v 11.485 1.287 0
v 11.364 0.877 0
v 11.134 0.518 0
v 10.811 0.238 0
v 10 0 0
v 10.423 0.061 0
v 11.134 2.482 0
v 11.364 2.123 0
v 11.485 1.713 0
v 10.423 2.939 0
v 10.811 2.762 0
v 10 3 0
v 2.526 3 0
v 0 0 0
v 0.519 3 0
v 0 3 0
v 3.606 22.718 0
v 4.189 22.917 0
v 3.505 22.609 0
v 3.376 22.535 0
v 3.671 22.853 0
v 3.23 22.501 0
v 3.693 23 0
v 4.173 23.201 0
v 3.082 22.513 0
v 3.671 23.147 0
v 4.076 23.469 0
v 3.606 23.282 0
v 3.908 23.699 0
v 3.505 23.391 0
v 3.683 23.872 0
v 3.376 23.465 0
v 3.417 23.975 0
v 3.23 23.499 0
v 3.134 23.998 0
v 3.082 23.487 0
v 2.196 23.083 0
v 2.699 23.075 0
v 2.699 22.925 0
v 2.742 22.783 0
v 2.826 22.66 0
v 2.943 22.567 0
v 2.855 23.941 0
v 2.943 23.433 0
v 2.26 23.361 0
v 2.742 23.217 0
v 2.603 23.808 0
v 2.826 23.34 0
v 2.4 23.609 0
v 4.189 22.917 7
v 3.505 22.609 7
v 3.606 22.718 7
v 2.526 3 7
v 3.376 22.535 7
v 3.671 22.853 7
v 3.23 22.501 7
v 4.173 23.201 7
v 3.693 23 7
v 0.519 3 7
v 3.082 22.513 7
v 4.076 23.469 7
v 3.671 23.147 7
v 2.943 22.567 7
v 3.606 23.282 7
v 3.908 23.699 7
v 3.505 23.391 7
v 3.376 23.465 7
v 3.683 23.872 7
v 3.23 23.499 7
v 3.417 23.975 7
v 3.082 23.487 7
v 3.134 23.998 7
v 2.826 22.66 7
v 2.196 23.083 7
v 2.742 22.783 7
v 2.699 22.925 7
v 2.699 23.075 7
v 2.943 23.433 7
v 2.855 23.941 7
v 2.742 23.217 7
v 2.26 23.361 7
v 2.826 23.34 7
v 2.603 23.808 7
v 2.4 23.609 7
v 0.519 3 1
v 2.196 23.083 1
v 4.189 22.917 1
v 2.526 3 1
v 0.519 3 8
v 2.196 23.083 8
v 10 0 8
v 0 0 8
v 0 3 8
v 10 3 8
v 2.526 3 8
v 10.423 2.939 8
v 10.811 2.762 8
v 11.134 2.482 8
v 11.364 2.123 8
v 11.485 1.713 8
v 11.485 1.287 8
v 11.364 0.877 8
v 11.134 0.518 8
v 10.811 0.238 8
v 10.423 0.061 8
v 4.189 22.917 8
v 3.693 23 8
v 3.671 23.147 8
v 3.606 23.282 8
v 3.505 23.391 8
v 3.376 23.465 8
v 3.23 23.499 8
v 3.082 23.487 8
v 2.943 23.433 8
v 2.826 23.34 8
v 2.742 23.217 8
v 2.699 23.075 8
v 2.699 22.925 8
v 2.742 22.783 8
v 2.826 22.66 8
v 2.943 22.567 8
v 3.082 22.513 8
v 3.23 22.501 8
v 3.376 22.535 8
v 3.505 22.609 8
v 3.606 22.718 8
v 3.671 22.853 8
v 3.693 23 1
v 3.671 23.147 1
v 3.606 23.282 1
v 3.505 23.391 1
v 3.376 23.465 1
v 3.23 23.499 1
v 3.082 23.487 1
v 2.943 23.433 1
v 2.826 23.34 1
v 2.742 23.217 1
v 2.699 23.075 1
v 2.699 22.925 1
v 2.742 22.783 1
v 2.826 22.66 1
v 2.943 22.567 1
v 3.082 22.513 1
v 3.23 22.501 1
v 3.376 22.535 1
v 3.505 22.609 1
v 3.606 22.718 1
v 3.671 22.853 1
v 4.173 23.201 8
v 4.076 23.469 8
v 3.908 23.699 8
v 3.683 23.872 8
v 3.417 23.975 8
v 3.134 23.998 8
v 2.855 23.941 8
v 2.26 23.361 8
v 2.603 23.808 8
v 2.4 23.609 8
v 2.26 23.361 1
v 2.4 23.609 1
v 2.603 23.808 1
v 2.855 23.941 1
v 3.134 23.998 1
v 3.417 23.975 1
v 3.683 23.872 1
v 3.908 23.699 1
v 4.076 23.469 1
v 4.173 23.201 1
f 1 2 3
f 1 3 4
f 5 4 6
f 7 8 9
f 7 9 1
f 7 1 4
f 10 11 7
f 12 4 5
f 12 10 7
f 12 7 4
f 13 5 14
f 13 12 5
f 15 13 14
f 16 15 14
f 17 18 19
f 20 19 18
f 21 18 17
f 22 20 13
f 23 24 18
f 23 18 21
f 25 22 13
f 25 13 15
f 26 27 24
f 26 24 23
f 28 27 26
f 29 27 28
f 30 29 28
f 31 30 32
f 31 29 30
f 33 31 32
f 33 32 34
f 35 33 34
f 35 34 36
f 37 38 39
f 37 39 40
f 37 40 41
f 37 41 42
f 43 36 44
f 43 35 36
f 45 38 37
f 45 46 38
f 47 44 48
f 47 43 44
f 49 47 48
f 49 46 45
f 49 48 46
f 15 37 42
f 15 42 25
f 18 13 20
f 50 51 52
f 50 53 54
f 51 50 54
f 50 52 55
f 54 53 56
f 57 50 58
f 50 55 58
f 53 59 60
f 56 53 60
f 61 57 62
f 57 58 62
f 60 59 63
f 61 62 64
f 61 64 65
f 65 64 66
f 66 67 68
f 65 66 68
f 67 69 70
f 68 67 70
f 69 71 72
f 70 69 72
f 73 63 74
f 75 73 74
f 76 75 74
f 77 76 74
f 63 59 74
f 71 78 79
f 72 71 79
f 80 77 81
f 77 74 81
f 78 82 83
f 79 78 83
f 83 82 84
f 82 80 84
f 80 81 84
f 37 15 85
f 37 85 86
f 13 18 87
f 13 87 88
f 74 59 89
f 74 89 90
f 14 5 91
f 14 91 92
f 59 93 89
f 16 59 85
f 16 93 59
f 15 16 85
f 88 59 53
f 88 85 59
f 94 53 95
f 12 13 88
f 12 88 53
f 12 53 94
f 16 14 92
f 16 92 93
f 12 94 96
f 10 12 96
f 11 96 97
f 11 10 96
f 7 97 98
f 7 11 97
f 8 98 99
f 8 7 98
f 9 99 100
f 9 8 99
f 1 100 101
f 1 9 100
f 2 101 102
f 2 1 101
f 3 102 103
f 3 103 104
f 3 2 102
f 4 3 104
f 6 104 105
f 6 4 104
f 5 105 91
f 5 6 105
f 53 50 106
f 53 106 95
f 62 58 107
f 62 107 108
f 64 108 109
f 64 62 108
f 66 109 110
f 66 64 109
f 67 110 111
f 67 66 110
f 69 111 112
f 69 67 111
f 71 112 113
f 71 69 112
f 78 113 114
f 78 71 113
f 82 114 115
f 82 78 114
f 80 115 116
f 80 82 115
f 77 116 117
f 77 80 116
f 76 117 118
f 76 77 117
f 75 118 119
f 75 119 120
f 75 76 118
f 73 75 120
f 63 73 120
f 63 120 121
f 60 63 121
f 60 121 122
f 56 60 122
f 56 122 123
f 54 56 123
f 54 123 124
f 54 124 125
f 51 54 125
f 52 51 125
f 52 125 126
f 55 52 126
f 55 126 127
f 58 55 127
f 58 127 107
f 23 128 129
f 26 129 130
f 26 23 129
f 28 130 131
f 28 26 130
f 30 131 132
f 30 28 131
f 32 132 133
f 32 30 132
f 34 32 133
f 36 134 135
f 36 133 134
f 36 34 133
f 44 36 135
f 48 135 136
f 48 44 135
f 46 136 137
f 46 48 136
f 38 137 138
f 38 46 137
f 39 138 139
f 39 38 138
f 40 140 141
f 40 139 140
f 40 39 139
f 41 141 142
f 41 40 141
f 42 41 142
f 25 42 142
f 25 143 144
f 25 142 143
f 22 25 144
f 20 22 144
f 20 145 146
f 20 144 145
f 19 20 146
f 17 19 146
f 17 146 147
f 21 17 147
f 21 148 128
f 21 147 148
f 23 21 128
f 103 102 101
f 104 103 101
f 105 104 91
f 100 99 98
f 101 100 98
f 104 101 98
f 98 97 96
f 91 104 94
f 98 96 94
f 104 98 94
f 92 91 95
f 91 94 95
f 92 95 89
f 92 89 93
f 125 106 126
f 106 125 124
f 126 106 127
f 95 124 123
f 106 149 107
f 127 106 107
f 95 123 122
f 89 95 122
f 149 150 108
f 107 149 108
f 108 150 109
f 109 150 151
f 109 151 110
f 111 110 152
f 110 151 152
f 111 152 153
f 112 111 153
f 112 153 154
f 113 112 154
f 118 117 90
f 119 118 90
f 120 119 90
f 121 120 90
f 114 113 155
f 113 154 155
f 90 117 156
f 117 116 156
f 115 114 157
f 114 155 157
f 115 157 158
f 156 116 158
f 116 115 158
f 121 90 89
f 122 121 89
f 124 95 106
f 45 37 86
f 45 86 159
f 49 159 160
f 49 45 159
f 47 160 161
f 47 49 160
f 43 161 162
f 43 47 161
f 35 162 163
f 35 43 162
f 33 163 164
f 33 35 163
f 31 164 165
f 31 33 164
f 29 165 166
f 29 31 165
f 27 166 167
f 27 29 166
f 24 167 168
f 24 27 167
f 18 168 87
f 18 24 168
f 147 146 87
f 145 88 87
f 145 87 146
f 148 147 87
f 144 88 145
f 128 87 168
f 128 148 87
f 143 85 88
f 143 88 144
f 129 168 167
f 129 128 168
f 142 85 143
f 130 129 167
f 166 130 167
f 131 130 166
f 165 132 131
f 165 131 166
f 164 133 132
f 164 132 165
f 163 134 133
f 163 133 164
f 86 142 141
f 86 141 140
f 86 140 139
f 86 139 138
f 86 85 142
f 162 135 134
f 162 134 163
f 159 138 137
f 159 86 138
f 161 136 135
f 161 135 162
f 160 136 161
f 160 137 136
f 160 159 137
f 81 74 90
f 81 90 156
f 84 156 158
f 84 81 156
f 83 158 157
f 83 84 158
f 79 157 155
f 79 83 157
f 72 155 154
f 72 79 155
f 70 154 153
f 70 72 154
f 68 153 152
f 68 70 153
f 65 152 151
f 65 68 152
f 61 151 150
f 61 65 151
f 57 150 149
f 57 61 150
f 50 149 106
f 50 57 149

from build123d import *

# Parameters (mm, degrees)
SKETCH_1_R          = 0.5
EXTRUDE_1_DEPTH     = 8
SKETCH_2_W          = 6
SKETCH_2_H          = 21
CUT_EXTRUDE_1_DEPTH = 7


with BuildPart() as part:
    # 草圖1 → 填料-伸長1 (new body)
    with BuildSketch(Plane.XY):
        with BuildLine():
            Line((0.519160932, 3), (2.196426588, 23.083226007))
            ThreePointArc((2.196426588, 23.083226007), (3.276183293, 23.996530698), (4.189487983, 22.916773993))
            Line((4.189487983, 22.916773993), (2.526123692, 3))
            Line((2.526123692, 3), (10, 3))
            ThreePointArc((10, 3), (11.5, 1.5), (10, 0))
            Line((10, 0), (0, 0))
            Line((0, 0), (0, 3))
            Line((0, 3), (0.519160932, 3))
        make_face()
        with Locations((3.192957285, 23)):
            Circle(SKETCH_1_R, mode=Mode.SUBTRACT)
    extrude(amount=EXTRUDE_1_DEPTH)

    # 草圖2 → 除料-伸長1 (cut)
    with BuildSketch(Plane.ZY):
        with Locations((4, 13.5)):
            Rectangle(SKETCH_2_W, SKETCH_2_H)
    extrude(amount=-CUT_EXTRUDE_1_DEPTH, mode=Mode.SUBTRACT)


solid = part.part
